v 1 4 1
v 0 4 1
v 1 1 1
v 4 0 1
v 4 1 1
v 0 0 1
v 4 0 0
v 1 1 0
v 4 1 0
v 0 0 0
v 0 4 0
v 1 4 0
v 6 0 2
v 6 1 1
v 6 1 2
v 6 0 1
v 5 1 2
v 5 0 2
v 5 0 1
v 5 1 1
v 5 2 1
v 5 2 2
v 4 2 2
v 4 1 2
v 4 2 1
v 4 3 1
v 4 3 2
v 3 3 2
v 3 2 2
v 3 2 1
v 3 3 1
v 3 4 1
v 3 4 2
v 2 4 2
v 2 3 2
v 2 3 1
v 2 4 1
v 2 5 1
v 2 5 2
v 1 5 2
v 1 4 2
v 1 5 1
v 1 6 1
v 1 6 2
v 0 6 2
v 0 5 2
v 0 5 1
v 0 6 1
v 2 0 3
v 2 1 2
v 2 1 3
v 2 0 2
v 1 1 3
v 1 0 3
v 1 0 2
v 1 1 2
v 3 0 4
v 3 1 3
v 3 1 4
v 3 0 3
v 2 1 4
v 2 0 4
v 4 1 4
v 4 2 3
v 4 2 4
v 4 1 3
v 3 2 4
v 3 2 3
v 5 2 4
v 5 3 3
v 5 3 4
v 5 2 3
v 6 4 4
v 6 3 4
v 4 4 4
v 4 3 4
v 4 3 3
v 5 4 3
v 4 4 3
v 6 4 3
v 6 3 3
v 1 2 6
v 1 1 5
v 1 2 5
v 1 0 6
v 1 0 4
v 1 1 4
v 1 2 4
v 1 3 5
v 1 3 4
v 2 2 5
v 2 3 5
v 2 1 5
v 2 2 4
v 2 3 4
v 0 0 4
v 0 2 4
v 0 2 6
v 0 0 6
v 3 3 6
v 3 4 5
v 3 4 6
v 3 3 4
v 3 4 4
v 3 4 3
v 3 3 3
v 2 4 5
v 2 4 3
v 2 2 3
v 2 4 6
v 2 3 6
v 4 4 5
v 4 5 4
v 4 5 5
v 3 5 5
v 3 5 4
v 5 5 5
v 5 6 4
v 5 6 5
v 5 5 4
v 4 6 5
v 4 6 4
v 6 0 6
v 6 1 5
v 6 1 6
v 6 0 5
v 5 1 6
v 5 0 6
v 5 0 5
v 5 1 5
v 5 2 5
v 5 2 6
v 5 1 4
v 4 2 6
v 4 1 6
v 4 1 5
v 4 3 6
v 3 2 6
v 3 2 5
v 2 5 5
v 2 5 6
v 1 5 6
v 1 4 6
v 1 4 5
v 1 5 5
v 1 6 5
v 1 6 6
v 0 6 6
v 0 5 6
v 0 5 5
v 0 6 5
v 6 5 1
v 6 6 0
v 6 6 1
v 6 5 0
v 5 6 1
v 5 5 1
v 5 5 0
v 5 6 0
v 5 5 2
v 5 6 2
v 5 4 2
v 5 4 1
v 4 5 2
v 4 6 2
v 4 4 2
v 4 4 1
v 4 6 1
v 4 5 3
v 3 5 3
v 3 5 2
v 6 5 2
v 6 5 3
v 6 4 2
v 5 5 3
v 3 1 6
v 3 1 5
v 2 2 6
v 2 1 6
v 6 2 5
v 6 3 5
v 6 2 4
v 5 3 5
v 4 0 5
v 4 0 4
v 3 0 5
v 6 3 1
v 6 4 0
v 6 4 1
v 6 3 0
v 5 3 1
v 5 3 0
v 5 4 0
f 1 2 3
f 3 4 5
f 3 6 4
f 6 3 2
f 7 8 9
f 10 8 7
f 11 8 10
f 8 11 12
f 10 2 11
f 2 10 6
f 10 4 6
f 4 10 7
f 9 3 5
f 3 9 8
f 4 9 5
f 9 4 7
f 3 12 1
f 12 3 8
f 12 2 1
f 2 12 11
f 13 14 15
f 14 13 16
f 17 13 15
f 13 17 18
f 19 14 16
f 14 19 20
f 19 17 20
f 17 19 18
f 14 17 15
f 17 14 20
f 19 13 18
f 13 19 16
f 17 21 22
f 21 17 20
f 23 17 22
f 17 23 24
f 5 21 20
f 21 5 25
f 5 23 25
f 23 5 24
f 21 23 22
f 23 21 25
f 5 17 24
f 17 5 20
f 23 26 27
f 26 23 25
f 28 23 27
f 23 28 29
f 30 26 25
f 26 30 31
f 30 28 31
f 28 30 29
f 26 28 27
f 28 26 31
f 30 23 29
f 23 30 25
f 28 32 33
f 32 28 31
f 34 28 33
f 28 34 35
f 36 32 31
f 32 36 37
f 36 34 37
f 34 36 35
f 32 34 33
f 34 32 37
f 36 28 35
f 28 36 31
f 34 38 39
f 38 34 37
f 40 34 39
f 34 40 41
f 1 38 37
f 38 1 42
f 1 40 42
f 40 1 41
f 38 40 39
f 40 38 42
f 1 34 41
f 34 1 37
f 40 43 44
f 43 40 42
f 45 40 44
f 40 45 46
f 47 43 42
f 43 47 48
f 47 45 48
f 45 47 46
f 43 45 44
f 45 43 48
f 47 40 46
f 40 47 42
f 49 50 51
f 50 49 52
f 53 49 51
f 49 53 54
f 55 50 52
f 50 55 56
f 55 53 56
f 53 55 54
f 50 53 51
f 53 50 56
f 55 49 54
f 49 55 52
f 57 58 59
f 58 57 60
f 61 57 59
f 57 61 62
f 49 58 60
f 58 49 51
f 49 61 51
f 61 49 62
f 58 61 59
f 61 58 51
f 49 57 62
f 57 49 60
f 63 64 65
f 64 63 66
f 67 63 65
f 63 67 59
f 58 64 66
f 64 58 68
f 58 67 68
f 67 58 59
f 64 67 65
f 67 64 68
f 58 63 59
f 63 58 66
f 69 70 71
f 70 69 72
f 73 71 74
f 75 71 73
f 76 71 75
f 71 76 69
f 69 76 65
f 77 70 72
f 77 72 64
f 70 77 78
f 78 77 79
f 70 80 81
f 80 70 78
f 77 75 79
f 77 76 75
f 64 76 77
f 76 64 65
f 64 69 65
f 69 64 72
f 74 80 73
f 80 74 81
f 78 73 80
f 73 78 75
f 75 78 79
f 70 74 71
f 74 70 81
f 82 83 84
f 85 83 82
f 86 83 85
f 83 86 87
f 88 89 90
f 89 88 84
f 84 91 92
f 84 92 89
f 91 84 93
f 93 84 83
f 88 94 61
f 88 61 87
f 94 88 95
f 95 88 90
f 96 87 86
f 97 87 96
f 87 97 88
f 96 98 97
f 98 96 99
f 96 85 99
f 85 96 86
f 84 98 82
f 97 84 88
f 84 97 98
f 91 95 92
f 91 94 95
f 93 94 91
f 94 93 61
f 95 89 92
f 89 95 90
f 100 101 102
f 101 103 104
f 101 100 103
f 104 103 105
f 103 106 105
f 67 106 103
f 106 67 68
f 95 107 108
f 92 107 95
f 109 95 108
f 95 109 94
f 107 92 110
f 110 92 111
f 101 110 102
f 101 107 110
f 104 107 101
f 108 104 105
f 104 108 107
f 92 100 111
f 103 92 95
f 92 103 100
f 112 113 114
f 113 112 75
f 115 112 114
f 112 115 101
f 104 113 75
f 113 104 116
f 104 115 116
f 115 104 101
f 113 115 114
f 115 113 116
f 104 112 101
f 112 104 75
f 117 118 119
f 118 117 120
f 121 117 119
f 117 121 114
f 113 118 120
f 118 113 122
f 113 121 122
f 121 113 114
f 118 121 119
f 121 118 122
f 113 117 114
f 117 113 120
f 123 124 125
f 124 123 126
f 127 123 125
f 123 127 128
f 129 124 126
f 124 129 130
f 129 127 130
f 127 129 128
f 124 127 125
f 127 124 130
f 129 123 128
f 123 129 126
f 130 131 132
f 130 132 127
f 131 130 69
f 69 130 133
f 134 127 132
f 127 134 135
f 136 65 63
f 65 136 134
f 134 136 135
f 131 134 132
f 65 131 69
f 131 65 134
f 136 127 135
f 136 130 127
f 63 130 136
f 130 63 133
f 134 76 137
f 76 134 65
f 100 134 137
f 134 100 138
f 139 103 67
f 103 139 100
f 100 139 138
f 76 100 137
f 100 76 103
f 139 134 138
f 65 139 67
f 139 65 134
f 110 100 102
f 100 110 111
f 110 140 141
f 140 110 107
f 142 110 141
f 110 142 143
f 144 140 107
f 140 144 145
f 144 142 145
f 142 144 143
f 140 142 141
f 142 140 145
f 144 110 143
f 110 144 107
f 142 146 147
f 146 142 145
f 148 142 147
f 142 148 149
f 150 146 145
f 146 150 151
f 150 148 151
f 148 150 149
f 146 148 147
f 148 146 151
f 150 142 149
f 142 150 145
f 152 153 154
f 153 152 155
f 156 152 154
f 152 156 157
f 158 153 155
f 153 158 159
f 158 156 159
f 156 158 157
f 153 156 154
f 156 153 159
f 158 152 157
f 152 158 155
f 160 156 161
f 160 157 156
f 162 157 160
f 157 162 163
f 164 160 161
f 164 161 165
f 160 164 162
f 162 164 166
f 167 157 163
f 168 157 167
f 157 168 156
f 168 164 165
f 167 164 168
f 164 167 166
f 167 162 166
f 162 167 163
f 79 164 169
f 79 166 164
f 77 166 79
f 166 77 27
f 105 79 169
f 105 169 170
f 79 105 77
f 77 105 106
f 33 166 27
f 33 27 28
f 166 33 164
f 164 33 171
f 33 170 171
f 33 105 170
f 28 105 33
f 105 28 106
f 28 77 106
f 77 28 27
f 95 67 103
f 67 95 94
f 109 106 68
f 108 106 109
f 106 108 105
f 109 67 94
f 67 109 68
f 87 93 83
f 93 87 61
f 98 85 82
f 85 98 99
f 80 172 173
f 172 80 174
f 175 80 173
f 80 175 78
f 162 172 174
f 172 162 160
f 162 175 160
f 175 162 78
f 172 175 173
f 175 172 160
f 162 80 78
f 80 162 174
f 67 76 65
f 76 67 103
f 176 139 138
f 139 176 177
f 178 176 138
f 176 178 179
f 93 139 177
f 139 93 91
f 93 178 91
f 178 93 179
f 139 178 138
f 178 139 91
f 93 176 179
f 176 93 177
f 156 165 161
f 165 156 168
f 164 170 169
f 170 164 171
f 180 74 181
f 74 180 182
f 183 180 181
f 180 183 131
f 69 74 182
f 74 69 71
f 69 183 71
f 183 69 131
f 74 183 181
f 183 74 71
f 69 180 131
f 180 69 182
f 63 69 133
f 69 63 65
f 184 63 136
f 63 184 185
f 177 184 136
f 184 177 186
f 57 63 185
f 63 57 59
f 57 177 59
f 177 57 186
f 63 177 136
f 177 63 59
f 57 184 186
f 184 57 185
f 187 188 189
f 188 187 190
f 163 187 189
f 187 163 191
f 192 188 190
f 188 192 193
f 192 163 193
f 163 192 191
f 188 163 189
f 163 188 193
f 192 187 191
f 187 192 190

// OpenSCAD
union() {
    translate([0.0, 0.0, 0.0]) cube([1, 1, 1]);
    translate([1.0, 0.0, 0.0]) cube([1, 1, 1]);
    translate([2.0, 0.0, 0.0]) cube([1, 1, 1]);
    translate([3.0, 0.0, 0.0]) cube([1, 1, 1]);
    translate([0.0, 1.0, 0.0]) cube([1, 1, 1]);
    translate([0.0, 2.0, 0.0]) cube([1, 1, 1]);
    translate([0.0, 3.0, 0.0]) cube([1, 1, 1]);
    translate([5.0, 0.0, 1.0]) cube([1, 1, 1]);
    translate([4.0, 1.0, 1.0]) cube([1, 1, 1]);
    translate([3.0, 2.0, 1.0]) cube([1, 1, 1]);
    translate([2.0, 3.0, 1.0]) cube([1, 1, 1]);
    translate([1.0, 4.0, 1.0]) cube([1, 1, 1]);
    translate([0.0, 5.0, 1.0]) cube([1, 1, 1]);
    translate([1.0, 0.0, 2.0]) cube([1, 1, 1]);
    translate([2.0, 0.0, 3.0]) cube([1, 1, 1]);
    translate([3.0, 1.0, 3.0]) cube([1, 1, 1]);
    translate([4.0, 2.0, 3.0]) cube([1, 1, 1]);
    translate([5.0, 3.0, 3.0]) cube([1, 1, 1]);
    translate([0.0, 0.0, 4.0]) cube([1, 1, 1]);
    translate([0.0, 1.0, 4.0]) cube([1, 1, 1]);
    translate([1.0, 2.0, 4.0]) cube([1, 1, 1]);
    translate([2.0, 3.0, 4.0]) cube([1, 1, 1]);
    translate([3.0, 4.0, 4.0]) cube([1, 1, 1]);
    translate([4.0, 5.0, 4.0]) cube([1, 1, 1]);
    translate([5.0, 0.0, 5.0]) cube([1, 1, 1]);
    translate([4.0, 1.0, 5.0]) cube([1, 1, 1]);
    translate([3.0, 2.0, 5.0]) cube([1, 1, 1]);
    translate([2.0, 3.0, 5.0]) cube([1, 1, 1]);
    translate([1.0, 4.0, 5.0]) cube([1, 1, 1]);
    translate([0.0, 5.0, 5.0]) cube([1, 1, 1]);
    translate([5.0, 5.0, 0.0]) cube([1, 1, 1]);
    translate([4.0, 4.0, 1.0]) cube([1, 1, 1]);
    translate([3.0, 3.0, 2.0]) cube([1, 1, 1]);
    translate([2.0, 2.0, 3.0]) cube([1, 1, 1]);
    translate([1.0, 1.0, 4.0]) cube([1, 1, 1]);
    translate([0.0, 0.0, 5.0]) cube([1, 1, 1]);
    translate([5.0, 4.0, 2.0]) cube([1, 1, 1]);
    translate([4.0, 3.0, 3.0]) cube([1, 1, 1]);
    translate([3.0, 2.0, 4.0]) cube([1, 1, 1]);
    translate([2.0, 1.0, 5.0]) cube([1, 1, 1]);
    translate([4.0, 5.0, 1.0]) cube([1, 1, 1]);
    translate([3.0, 4.0, 2.0]) cube([1, 1, 1]);
    translate([2.0, 3.0, 3.0]) cube([1, 1, 1]);
    translate([1.0, 2.0, 4.0]) cube([1, 1, 1]);
    translate([0.0, 1.0, 5.0]) cube([1, 1, 1]);
    translate([5.0, 2.0, 4.0]) cube([1, 1, 1]);
    translate([4.0, 1.0, 4.0]) cube([1, 1, 1]);
    translate([3.0, 0.0, 4.0]) cube([1, 1, 1]);
    translate([5.0, 3.0, 0.0]) cube([1, 1, 1]);
}
